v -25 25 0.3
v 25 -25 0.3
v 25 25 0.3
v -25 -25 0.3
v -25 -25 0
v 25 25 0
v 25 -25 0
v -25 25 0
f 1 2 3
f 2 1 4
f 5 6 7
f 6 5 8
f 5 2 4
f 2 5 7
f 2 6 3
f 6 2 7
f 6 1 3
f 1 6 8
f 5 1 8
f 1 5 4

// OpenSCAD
/* [First Layer] */
// First layer height
height = 0.3;//[0.1, 0.2, 0.3, 0.4, 0.5]
// First layer size
size = 50;//[5:5:150]

translate([-size/2, -size/2,0])
  cube([size, size, height]);
